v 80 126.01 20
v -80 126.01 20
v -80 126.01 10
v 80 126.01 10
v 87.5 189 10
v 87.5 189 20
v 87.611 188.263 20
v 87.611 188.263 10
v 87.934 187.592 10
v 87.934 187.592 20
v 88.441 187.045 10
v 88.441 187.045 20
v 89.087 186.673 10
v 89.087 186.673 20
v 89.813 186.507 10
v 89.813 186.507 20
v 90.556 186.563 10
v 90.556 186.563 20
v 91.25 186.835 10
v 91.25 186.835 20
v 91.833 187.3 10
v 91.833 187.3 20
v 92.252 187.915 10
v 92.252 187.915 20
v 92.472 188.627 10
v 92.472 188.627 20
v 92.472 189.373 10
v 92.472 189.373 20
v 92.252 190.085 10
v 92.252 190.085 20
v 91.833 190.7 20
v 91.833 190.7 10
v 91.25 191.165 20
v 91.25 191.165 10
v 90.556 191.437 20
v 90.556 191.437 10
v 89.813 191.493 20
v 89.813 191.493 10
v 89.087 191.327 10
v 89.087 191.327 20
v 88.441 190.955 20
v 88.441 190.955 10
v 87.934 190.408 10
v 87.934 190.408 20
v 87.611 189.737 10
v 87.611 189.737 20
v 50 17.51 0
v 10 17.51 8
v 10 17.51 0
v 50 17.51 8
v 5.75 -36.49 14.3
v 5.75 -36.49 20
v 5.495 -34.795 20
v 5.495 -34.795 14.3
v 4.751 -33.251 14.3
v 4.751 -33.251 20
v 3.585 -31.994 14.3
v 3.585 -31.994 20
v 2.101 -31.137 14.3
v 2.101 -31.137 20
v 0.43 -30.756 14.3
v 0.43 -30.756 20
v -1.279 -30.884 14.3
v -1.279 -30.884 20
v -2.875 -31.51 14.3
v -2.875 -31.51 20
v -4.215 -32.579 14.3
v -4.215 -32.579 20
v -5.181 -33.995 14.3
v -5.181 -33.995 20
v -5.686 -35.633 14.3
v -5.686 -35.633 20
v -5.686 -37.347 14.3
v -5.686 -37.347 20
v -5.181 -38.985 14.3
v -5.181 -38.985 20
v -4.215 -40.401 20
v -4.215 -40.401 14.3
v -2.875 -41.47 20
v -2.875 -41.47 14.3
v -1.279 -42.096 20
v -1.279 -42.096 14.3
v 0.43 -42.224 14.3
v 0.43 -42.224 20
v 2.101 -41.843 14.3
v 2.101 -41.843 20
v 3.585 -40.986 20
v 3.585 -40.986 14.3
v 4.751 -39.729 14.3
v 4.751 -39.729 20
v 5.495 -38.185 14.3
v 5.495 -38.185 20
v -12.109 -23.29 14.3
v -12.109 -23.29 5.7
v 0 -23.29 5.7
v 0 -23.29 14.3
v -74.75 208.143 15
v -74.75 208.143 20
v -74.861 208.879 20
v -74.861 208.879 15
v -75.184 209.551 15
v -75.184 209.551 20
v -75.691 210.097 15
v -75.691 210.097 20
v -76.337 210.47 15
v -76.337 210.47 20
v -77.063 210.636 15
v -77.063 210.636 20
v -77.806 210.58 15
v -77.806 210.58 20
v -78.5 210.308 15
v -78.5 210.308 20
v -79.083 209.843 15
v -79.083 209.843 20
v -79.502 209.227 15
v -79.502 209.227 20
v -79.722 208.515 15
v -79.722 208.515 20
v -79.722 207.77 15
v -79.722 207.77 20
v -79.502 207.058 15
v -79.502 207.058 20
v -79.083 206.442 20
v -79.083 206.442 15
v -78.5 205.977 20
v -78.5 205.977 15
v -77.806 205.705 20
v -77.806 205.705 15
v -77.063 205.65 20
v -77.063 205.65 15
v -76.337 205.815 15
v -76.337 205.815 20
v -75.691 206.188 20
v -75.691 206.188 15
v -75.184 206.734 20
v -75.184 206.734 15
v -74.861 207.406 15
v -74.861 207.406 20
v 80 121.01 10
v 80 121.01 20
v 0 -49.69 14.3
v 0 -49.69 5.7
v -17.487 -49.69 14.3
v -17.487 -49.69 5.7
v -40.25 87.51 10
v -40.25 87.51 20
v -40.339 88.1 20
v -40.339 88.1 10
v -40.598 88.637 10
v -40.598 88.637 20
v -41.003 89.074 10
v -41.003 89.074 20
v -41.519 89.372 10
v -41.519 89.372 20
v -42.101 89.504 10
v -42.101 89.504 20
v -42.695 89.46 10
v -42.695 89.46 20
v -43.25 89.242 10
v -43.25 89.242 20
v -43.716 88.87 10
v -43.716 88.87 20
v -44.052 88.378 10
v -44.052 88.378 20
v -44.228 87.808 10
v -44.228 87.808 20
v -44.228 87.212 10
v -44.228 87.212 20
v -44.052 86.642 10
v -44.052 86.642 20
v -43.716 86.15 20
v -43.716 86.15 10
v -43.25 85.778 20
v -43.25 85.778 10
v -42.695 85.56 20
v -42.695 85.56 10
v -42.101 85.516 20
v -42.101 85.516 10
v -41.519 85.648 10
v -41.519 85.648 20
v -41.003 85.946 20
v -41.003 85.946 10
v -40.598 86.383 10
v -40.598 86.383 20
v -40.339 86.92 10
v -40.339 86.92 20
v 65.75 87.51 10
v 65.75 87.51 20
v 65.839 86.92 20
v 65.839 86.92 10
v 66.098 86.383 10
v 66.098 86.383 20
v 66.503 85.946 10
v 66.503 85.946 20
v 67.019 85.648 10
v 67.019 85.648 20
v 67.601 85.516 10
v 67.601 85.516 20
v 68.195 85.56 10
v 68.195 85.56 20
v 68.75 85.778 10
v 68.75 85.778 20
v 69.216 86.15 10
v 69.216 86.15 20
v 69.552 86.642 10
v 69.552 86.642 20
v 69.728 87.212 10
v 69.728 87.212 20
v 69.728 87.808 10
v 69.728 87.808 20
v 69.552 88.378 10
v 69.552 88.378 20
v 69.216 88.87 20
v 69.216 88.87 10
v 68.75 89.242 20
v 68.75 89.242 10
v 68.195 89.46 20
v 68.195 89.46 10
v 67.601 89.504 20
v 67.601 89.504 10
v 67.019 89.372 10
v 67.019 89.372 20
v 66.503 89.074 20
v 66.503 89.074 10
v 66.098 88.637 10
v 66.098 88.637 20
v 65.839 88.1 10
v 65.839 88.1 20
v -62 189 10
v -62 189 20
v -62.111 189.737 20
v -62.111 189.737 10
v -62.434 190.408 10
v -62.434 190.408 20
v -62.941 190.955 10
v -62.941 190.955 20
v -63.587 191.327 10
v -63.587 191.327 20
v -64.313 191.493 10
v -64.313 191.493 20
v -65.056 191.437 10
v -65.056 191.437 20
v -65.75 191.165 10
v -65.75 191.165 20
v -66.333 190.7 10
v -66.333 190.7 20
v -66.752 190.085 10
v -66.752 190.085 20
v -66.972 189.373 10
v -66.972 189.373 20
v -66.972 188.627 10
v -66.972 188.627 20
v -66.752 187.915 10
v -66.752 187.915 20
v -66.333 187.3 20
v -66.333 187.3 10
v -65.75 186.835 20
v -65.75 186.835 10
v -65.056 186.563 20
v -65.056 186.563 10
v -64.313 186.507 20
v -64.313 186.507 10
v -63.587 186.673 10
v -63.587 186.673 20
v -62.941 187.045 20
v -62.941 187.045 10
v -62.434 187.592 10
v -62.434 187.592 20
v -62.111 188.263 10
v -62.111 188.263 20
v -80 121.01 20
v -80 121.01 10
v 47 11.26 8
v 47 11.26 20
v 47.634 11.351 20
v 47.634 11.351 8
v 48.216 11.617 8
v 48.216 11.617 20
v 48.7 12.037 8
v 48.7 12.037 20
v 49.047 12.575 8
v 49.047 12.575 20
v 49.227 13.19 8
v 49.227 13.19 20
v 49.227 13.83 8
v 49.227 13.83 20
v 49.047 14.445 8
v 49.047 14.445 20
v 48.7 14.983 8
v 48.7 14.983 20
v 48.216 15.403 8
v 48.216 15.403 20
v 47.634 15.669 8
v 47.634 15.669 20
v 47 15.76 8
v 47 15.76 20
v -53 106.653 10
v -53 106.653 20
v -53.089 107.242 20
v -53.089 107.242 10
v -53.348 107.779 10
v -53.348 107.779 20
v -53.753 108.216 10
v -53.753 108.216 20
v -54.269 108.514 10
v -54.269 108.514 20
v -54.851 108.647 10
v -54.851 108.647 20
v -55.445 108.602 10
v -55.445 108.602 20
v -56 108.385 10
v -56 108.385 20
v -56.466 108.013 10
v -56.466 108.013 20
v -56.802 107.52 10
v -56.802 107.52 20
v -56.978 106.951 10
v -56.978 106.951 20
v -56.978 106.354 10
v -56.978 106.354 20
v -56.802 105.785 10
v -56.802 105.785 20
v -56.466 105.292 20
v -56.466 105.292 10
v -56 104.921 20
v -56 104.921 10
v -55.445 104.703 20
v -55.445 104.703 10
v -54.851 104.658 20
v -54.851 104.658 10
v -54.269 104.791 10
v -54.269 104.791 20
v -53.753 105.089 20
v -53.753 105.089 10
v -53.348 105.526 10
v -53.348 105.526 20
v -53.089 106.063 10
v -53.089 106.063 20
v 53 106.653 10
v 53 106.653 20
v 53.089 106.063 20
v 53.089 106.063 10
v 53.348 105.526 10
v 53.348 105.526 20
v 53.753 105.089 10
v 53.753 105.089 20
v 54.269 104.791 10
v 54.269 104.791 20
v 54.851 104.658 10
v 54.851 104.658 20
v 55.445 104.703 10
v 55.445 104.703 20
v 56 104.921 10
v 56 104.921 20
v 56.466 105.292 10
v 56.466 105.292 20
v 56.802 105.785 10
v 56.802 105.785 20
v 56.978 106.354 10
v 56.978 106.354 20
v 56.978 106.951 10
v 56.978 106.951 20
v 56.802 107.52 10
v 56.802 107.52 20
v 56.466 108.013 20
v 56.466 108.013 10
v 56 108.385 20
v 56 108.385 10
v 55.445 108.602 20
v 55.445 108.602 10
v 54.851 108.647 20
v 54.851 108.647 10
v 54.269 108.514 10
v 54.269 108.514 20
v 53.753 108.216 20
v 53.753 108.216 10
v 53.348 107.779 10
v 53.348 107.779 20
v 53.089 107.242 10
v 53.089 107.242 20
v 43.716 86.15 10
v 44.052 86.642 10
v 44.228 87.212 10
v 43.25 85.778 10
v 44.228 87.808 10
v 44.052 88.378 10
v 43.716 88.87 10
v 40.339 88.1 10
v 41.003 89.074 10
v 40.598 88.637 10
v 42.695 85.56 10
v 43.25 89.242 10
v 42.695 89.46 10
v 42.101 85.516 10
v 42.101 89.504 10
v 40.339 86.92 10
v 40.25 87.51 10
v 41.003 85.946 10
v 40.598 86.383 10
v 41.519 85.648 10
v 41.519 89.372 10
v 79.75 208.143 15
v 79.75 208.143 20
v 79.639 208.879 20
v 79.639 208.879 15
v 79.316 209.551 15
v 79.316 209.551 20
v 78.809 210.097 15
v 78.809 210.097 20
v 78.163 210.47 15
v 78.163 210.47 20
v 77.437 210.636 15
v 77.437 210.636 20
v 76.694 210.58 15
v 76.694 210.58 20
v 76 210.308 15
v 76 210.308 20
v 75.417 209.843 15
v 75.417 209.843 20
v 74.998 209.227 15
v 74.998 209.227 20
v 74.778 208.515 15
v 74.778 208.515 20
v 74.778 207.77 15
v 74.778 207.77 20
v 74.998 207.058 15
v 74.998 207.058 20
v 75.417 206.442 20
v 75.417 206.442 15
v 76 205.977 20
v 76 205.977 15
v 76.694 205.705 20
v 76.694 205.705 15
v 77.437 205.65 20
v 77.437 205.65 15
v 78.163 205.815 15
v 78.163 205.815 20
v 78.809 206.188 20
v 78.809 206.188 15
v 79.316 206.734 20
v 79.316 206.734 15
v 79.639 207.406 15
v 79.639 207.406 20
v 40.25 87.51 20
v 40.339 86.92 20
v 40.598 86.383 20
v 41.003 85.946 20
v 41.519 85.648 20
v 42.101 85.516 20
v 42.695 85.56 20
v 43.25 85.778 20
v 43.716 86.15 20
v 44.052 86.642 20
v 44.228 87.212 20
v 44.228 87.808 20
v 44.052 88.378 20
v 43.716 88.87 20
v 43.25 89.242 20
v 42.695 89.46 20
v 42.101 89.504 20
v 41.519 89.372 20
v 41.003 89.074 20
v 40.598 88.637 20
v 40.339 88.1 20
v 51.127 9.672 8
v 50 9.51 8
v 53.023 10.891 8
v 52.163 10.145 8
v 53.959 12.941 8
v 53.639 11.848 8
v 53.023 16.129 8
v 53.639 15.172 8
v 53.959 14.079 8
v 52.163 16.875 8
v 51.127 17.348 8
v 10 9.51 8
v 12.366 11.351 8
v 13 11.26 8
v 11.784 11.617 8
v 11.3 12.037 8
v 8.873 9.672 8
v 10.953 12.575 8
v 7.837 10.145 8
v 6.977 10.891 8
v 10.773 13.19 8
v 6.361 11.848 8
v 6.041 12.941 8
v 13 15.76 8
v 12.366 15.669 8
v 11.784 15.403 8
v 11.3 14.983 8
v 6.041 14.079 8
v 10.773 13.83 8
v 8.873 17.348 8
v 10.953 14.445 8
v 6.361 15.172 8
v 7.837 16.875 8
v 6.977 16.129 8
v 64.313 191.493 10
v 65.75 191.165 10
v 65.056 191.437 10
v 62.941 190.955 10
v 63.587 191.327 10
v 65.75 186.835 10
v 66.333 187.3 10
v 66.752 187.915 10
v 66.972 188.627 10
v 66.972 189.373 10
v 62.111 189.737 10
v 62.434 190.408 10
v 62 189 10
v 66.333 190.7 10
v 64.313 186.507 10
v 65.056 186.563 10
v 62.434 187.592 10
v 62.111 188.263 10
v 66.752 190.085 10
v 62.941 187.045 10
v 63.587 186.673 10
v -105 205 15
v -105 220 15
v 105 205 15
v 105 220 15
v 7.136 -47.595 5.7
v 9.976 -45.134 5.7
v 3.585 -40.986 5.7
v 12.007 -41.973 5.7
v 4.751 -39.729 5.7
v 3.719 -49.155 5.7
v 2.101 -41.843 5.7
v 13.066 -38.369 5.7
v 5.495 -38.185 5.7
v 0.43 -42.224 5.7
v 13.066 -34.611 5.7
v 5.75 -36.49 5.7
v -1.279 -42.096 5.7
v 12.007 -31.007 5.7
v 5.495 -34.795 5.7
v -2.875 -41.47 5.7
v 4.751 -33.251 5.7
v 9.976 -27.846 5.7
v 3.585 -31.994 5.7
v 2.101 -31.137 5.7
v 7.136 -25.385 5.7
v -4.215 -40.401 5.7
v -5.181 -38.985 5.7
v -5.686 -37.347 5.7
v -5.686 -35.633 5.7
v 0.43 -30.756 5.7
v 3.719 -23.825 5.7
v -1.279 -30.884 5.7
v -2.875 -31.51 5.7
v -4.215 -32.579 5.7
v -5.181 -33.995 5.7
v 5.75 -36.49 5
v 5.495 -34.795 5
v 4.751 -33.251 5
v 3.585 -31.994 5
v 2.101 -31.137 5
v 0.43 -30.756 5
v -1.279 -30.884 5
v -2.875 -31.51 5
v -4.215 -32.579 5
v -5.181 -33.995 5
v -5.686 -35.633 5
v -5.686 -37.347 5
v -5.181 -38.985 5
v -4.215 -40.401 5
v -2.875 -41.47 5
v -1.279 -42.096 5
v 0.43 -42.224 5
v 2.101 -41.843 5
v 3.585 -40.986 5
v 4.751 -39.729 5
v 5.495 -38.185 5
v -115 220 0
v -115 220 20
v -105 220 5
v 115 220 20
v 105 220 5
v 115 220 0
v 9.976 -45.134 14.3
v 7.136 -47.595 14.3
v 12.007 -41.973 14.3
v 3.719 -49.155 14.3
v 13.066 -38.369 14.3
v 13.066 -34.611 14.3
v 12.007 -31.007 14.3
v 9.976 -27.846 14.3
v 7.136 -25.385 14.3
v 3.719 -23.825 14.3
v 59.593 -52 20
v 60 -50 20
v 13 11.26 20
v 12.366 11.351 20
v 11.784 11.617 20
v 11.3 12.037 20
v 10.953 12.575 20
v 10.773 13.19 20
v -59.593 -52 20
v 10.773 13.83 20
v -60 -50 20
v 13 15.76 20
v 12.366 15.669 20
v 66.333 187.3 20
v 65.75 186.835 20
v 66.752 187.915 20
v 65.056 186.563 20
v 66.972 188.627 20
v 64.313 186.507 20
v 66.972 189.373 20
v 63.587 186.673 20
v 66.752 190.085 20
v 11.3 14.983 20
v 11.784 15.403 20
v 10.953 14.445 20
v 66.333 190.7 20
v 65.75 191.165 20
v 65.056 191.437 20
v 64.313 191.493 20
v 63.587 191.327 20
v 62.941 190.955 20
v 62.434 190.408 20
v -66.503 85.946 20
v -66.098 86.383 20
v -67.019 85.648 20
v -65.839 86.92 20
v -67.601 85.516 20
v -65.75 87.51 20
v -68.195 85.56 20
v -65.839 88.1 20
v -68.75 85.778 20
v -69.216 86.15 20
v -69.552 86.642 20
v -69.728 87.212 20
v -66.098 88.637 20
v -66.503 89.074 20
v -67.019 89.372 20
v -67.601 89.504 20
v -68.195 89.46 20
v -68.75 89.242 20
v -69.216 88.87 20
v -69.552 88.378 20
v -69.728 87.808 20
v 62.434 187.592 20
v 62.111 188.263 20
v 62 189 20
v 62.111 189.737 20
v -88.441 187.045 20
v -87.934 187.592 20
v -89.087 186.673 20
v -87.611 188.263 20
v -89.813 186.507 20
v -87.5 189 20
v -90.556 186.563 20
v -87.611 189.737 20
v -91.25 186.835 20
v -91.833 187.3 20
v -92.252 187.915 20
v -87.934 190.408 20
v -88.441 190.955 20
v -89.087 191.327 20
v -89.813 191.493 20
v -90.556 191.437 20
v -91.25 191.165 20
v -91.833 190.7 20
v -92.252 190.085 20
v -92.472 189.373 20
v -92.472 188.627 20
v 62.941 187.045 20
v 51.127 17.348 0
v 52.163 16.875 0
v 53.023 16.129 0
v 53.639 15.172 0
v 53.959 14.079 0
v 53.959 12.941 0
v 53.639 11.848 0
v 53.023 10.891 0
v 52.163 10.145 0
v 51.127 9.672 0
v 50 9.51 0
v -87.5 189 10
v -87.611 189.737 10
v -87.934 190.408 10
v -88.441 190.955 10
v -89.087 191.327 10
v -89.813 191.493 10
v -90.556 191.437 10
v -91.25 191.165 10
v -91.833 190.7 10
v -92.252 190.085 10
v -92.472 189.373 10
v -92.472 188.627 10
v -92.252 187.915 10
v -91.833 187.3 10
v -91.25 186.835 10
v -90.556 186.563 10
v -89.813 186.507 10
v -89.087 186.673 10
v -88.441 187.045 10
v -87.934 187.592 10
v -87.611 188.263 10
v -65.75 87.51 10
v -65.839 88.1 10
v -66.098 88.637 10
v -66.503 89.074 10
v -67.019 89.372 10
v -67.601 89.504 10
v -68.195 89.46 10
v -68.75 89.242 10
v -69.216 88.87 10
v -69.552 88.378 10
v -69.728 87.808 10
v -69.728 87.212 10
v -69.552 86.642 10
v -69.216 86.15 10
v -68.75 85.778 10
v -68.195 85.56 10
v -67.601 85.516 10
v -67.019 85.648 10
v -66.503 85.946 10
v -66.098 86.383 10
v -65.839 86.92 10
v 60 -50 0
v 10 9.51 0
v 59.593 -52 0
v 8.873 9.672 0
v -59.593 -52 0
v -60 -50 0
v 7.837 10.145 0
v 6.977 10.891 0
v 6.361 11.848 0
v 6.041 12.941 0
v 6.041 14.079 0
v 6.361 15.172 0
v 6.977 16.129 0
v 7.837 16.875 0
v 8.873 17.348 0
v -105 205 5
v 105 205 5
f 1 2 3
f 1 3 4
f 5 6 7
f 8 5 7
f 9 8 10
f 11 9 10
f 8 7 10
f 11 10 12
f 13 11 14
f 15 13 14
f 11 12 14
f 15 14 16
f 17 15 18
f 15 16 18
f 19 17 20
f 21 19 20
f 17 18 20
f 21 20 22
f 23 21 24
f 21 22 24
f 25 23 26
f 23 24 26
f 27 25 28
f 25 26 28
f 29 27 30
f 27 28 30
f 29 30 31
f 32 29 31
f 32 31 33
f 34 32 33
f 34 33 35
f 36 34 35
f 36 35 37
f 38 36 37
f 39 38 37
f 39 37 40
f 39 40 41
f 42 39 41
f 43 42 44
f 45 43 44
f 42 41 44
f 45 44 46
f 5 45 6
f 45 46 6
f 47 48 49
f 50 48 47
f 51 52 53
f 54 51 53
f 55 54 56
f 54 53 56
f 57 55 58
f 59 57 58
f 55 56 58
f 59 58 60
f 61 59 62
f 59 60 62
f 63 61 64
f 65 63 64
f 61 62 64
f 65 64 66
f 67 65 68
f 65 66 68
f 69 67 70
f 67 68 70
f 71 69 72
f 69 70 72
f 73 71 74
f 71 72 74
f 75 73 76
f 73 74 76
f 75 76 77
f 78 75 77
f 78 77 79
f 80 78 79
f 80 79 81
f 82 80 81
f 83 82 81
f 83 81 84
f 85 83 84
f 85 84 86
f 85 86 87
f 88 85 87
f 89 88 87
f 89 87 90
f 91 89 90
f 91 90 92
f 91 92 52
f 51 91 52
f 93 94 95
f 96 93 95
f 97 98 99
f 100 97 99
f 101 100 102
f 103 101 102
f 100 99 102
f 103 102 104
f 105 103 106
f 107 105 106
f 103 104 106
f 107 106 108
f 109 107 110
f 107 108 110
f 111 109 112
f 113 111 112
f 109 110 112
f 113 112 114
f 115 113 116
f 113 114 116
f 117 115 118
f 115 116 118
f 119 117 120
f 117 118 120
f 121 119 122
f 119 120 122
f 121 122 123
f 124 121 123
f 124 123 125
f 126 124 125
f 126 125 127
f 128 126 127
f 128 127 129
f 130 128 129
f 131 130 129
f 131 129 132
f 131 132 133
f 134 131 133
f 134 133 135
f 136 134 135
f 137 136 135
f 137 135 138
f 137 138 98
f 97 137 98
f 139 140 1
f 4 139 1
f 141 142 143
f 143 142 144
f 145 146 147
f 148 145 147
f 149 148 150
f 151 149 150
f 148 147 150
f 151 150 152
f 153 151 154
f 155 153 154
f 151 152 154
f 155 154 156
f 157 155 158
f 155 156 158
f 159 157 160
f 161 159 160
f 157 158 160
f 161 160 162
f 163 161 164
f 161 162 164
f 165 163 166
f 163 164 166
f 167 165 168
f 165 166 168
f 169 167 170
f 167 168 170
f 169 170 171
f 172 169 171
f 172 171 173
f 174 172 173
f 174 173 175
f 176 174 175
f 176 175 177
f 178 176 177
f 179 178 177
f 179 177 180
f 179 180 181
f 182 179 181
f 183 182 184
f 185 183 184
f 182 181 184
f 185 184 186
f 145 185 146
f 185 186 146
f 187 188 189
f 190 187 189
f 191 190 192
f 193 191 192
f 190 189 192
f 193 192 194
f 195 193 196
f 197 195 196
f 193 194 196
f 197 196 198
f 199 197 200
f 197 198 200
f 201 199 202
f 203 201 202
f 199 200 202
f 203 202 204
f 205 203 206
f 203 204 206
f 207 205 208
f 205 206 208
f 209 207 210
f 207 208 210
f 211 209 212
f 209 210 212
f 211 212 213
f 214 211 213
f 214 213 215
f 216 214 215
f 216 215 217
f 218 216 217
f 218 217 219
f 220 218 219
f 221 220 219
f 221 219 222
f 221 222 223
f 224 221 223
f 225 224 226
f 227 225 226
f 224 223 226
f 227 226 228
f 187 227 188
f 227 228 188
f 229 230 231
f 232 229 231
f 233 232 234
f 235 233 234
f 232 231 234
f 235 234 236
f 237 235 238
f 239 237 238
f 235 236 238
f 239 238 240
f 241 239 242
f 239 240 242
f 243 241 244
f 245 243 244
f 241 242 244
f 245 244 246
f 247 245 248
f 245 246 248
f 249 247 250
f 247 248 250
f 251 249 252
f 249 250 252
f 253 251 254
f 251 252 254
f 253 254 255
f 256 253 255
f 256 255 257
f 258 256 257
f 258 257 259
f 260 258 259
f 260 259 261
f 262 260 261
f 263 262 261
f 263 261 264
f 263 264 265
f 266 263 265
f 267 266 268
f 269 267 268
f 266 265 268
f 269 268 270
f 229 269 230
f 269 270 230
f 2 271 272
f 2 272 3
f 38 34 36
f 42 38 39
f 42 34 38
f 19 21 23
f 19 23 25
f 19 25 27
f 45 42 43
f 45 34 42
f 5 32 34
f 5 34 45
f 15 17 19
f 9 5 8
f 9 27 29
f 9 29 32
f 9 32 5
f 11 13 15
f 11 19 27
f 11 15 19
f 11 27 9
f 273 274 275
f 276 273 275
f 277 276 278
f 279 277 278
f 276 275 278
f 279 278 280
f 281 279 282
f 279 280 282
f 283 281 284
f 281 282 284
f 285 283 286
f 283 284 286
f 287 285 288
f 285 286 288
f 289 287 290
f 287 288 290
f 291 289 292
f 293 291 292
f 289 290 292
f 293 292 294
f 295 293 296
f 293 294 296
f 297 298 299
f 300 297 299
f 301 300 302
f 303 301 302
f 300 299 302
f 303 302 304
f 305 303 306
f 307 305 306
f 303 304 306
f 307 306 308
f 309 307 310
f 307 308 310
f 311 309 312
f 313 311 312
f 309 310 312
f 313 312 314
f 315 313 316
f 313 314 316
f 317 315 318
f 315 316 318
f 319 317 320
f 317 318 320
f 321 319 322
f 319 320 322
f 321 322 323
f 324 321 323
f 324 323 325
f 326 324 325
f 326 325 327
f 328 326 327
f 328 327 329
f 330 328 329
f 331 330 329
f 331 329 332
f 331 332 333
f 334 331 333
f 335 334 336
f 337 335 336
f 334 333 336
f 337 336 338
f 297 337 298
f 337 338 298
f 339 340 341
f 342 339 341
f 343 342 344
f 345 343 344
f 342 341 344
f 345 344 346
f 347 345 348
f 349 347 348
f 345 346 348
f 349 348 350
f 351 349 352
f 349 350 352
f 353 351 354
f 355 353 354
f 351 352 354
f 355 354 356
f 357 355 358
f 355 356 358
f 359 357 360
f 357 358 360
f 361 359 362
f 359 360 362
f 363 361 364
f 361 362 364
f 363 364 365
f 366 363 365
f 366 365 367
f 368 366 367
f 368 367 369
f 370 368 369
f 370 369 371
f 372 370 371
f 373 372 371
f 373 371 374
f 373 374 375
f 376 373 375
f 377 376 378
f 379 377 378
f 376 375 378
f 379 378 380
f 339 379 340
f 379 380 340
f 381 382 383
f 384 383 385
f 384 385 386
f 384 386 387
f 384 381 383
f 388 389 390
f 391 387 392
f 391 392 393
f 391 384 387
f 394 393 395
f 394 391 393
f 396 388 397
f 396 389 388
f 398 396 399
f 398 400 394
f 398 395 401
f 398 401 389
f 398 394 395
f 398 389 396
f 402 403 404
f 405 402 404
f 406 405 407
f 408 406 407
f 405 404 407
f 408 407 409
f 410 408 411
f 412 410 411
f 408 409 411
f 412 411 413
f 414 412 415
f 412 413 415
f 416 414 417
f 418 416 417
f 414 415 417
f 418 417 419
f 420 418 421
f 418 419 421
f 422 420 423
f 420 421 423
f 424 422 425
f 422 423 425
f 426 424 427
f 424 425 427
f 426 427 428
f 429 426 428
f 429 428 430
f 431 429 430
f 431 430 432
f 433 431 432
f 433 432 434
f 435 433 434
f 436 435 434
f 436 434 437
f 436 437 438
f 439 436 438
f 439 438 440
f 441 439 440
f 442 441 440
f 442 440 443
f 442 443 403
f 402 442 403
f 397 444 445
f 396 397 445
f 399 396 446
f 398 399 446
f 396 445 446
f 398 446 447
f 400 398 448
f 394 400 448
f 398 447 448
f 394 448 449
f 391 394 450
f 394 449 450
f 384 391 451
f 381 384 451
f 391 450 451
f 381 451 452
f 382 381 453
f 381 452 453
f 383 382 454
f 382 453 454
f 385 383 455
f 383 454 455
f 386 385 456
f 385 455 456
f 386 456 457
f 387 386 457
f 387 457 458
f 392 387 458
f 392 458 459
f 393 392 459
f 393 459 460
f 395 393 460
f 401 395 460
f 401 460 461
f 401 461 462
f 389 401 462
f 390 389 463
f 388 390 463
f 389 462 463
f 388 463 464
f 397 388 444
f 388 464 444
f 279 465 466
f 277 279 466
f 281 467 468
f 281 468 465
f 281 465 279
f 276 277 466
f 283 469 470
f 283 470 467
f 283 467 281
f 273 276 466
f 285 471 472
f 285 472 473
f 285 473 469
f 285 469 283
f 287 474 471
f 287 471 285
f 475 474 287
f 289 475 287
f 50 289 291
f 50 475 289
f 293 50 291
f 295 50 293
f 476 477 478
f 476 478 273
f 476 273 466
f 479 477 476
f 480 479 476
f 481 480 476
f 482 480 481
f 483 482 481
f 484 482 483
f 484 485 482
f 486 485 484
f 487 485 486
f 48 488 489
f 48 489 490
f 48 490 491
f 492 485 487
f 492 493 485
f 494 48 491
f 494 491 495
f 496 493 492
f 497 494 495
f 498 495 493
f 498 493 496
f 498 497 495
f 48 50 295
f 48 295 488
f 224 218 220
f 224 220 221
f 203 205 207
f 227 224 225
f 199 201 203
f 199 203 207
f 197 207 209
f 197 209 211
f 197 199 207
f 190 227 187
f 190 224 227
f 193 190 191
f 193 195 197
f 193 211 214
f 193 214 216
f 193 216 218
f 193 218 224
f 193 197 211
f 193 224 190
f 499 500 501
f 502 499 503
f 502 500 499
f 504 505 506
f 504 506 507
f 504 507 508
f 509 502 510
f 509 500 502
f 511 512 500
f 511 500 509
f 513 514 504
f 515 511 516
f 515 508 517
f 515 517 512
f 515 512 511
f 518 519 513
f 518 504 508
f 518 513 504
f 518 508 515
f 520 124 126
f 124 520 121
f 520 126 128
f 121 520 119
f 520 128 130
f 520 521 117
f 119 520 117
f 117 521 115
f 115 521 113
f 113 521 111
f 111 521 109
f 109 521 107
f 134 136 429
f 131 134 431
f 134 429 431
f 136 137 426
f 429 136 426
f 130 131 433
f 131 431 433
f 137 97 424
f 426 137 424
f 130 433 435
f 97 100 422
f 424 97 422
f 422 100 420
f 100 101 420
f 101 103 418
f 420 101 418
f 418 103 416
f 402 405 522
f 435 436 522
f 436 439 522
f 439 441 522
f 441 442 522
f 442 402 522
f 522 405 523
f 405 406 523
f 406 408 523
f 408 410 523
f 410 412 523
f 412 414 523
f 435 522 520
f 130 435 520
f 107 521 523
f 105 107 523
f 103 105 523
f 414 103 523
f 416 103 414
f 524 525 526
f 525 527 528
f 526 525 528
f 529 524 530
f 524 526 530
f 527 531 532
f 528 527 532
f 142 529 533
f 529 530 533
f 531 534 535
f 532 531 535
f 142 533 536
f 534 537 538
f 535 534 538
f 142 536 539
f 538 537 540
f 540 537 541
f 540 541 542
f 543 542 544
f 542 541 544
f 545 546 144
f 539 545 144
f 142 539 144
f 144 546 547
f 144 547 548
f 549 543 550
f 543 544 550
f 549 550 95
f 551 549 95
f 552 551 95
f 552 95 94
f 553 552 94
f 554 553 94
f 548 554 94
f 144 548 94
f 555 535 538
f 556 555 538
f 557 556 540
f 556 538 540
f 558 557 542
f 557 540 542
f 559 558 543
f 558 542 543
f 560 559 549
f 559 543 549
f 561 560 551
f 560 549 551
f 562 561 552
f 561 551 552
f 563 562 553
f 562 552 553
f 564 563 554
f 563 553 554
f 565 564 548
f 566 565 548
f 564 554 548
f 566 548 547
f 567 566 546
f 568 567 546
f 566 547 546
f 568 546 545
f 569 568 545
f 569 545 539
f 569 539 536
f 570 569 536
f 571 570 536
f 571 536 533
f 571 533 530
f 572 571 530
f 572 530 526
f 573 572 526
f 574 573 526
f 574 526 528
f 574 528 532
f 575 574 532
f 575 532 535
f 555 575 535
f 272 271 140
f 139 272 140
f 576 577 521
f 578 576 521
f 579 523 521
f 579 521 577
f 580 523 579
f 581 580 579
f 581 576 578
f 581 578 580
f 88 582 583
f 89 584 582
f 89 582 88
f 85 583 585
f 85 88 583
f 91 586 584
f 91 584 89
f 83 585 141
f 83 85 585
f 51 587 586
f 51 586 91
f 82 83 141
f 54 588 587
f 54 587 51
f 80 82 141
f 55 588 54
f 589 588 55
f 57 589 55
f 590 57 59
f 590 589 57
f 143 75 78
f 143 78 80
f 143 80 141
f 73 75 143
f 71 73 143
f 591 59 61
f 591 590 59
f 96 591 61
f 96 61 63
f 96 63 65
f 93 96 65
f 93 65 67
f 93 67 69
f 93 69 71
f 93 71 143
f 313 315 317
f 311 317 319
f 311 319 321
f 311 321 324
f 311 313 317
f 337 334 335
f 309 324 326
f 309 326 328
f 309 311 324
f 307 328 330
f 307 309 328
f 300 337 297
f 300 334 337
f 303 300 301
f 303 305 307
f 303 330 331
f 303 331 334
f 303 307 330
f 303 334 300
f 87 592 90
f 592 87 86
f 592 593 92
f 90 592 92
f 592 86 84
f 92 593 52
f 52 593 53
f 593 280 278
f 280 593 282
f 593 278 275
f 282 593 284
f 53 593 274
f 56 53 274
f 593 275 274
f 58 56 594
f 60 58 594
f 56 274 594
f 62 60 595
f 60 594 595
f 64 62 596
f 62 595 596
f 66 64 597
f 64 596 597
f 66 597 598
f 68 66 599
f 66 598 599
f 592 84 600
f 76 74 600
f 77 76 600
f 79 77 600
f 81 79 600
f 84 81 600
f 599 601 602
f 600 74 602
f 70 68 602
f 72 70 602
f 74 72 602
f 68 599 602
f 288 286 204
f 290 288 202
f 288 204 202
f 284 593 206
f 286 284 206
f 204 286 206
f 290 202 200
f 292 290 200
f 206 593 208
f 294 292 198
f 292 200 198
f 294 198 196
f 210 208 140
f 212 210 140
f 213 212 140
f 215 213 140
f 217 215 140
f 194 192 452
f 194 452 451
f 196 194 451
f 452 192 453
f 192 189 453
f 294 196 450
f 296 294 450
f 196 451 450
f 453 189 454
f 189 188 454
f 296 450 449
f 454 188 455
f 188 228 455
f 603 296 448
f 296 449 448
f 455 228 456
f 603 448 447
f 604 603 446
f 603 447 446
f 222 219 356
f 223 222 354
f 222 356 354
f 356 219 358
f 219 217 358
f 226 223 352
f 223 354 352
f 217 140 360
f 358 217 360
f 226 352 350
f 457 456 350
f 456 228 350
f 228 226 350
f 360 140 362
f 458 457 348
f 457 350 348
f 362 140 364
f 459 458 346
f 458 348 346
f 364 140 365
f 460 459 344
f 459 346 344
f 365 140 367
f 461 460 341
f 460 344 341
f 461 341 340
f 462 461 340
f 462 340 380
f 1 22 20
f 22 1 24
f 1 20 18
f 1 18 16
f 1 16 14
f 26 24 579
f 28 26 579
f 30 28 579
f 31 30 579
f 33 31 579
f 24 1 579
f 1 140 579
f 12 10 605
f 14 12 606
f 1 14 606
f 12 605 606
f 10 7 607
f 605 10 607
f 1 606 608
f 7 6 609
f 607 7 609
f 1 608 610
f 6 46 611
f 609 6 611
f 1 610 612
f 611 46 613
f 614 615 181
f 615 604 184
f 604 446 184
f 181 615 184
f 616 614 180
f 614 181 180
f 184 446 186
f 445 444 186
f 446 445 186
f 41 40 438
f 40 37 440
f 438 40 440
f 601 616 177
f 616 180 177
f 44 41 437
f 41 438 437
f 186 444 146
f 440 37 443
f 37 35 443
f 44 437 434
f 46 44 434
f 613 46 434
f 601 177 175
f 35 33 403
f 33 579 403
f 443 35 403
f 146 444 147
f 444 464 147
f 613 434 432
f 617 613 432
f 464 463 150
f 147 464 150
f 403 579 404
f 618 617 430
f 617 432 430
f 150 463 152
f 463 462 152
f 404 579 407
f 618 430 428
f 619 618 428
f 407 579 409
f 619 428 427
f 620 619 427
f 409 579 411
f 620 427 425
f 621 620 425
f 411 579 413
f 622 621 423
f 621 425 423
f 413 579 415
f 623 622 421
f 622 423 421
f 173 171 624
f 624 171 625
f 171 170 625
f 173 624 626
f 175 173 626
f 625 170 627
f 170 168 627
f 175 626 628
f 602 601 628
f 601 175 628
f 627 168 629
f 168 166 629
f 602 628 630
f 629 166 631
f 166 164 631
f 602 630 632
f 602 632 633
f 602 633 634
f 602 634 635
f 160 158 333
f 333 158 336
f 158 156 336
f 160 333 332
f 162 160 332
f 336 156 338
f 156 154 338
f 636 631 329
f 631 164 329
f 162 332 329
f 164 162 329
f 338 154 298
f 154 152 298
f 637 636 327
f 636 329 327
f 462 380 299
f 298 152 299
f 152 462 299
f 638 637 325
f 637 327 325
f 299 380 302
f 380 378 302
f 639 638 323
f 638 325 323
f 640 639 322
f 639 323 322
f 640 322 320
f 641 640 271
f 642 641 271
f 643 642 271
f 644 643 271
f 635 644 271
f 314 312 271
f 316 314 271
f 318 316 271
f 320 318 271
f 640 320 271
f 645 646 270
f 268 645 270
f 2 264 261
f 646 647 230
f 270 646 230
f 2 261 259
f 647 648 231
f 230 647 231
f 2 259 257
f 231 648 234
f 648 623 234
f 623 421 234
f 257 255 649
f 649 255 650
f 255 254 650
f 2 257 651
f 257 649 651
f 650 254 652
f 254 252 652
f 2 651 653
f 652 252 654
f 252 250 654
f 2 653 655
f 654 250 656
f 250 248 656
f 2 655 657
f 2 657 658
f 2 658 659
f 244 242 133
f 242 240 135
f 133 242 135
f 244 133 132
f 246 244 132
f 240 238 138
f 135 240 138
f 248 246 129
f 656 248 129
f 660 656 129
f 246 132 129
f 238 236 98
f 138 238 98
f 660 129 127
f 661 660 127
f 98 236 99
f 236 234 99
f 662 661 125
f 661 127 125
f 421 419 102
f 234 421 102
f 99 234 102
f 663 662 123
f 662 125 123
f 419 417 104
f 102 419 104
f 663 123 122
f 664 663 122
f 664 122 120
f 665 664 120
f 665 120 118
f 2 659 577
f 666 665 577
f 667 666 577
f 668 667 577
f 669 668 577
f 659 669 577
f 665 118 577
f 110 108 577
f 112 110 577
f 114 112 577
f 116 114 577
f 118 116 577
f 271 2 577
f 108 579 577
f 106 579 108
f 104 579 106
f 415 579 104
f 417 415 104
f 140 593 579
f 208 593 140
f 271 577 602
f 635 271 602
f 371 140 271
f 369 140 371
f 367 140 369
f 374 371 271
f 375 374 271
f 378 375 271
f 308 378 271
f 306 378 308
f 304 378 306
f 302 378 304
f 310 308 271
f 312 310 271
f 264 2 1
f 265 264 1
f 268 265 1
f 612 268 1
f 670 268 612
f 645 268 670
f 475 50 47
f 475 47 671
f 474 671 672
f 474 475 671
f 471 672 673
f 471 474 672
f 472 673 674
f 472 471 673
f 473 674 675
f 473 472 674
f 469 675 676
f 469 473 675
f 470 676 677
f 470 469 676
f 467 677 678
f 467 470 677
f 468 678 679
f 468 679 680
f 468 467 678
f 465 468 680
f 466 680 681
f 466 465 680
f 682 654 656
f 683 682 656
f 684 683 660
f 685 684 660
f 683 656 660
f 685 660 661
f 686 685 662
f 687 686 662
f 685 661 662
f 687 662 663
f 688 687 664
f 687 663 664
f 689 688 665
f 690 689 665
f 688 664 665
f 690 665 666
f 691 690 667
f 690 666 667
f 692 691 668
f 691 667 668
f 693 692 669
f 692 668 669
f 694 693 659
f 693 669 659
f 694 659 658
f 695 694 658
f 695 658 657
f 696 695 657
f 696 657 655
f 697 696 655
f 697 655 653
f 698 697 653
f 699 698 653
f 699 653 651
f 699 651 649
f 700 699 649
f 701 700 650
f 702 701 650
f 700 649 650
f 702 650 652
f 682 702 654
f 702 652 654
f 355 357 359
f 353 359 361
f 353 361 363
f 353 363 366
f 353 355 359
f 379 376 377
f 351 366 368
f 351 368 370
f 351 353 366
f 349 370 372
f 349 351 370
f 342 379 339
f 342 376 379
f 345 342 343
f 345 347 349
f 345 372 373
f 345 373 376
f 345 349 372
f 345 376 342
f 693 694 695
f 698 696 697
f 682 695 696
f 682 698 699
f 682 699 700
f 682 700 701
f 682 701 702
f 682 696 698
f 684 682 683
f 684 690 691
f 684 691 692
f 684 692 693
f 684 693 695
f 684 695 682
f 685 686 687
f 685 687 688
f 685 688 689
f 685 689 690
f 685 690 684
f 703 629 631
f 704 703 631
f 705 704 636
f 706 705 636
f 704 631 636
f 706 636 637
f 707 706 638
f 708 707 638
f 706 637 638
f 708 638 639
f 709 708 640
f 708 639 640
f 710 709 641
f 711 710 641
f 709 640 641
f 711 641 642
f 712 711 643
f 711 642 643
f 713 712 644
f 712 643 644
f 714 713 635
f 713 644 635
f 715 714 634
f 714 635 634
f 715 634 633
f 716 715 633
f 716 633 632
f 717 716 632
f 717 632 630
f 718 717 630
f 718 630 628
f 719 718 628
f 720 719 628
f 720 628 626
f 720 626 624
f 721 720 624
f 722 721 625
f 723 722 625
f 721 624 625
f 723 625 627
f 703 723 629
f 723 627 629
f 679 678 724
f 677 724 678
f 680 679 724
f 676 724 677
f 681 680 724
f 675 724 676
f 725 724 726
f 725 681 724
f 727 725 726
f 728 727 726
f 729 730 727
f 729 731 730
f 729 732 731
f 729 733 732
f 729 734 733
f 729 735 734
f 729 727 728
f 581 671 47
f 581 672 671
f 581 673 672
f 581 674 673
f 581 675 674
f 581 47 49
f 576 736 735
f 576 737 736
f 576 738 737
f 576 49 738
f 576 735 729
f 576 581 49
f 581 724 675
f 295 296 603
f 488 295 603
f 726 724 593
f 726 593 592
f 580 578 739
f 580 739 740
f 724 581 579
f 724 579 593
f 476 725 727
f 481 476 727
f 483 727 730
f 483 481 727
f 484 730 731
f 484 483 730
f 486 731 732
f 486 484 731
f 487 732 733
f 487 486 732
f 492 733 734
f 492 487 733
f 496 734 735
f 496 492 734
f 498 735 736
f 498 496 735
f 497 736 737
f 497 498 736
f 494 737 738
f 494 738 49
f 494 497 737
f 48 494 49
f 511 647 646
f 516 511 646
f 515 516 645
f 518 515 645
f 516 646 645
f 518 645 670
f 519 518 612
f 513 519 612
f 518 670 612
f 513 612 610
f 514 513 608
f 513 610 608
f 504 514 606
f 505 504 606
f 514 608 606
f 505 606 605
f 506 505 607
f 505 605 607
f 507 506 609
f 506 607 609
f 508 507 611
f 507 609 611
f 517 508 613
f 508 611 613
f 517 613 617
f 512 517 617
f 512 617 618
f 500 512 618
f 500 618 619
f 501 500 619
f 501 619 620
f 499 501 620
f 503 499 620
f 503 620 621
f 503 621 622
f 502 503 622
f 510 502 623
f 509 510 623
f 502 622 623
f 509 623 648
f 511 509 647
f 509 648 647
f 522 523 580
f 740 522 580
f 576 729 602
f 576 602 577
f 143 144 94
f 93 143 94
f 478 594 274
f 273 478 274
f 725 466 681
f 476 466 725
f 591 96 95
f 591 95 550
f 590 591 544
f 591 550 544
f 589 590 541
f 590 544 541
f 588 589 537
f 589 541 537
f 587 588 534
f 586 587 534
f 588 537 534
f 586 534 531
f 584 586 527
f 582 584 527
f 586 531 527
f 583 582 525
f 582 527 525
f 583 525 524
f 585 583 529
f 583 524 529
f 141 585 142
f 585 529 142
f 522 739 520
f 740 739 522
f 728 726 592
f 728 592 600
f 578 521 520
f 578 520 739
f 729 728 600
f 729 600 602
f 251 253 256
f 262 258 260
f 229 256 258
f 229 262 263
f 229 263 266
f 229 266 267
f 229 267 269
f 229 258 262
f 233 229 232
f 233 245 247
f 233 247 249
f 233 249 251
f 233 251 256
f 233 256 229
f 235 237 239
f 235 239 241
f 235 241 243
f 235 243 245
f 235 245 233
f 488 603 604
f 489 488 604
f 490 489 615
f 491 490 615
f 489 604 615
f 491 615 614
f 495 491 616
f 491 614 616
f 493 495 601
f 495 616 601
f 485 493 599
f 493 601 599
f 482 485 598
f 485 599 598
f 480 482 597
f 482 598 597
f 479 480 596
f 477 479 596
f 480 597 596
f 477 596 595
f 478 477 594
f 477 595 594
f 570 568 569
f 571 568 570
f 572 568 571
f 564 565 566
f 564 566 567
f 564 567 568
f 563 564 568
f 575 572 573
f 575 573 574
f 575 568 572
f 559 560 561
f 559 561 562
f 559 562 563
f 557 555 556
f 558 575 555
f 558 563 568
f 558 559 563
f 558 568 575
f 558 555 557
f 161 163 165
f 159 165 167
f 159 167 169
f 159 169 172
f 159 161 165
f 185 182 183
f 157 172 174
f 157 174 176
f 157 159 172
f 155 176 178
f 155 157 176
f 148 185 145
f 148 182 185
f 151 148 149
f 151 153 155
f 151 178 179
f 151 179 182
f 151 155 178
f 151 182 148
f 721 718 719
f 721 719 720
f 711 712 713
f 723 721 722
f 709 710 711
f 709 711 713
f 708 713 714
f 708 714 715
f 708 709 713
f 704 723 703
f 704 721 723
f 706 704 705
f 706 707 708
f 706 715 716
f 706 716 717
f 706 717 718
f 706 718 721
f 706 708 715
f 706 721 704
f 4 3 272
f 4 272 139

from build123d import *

# Parameters (mm, degrees)
EXTRUDE_1_DEPTH     = 20
SKETCH_3_W          = 210
SKETCH_3_H          = 10
CUT_EXTRUDE_1_DEPTH = 15
SKETCH_4_W          = 160
SKETCH_4_H          = 5
CUT_EXTRUDE_2_DEPTH = 10
SKETCH_5_R          = 2.5
SKETCH_5_R_2        = 2
CUT_EXTRUDE_3_DEPTH = 10
CUT_EXTRUDE_4_DEPTH = 4.3
SKETCH_8_R          = 5.75
CUT_EXTRUDE_6_DEPTH = 15
CUT_EXTRUDE_7_DEPTH = 250.048188108
CUT_EXTRUDE_START   = -8
CUT_EXTRUDE_8_DEPTH = 8


with BuildPart() as part:
    # 草图1 → 凸台-拉伸1 (new body)
    with BuildSketch(Plane.XY):
        Polygon((-115, 220), (115, 220), (60, -50), (59.592592593, -52), (-59.592592593, -52), (-60, -50), align=None)
    extrude(amount=EXTRUDE_1_DEPTH)

    # 草图3 → 切除-拉伸1 (cut)
    with BuildSketch(Plane(origin=(0, 220, 0), x_dir=(1, 0, 0), z_dir=(0, 1, 0))):
        with Locations((0, -10)):
            Rectangle(SKETCH_3_W, SKETCH_3_H)
    extrude(amount=-CUT_EXTRUDE_1_DEPTH, mode=Mode.SUBTRACT)

    # 草图4 → 切除-拉伸2 (cut)
    with BuildSketch(Plane.XY.offset(20)):
        with Locations((0, 123.51)):
            Rectangle(SKETCH_4_W, SKETCH_4_H)
    extrude(amount=-CUT_EXTRUDE_2_DEPTH, mode=Mode.SUBTRACT)

    # 草图5 → 切除-拉伸3 (cut)
    with BuildSketch(Plane.XY.offset(20)):
        with Locations((-77.25, 208.1425573)):
            Circle(SKETCH_5_R)
        with Locations((-90, 189)):
            Circle(SKETCH_5_R)
        with Locations((-64.5, 189)):
            Circle(SKETCH_5_R)
        with Locations((-55, 106.6525573)):
            Circle(SKETCH_5_R_2)
        with Locations((-67.75, 87.51)):
            Circle(SKETCH_5_R_2)
        with Locations((-42.25, 87.51)):
            Circle(SKETCH_5_R_2)
        with Locations(Location((42.25, 87.51, 0), (0, 0, 180))):
            Circle(SKETCH_5_R_2)
        with Locations(Location((67.75, 87.51, 0), (0, 0, 180))):
            Circle(SKETCH_5_R_2)
        with Locations(Location((55, 106.6525573, 0), (0, 0, 180))):
            Circle(SKETCH_5_R_2)
        with Locations(Location((64.5, 189, 0), (0, 0, 180))):
            Circle(SKETCH_5_R)
        with Locations(Location((90, 189, 0), (0, 0, 180))):
            Circle(SKETCH_5_R)
        with Locations((77.25, 208.1425573)):
            Circle(SKETCH_5_R)
    extrude(amount=-CUT_EXTRUDE_3_DEPTH, mode=Mode.SUBTRACT)

    # 草图6 → 切除-拉伸4 (cut, symmetric)
    with BuildSketch(Plane(origin=(0, 0, 10), x_dir=(-1, 0, 0), z_dir=(0, 0, -1))):
        with BuildLine():
            Line((0, -49.69), (17.486671343, -49.69))
            Line((17.486671343, -49.69), (12.108893566, -23.29))
            Line((12.108893566, -23.29), (0, -23.29))
            ThreePointArc((0, -23.29), (-13.2, -36.49), (0, -49.69))
        make_face()
    extrude(amount=CUT_EXTRUDE_4_DEPTH, both=True, mode=Mode.SUBTRACT)

    # 草图8 → 切除-拉伸6 (cut)
    with BuildSketch(Plane.XY.offset(20)):
        with Locations((0, -36.49)):
            Circle(SKETCH_8_R)
    extrude(amount=-CUT_EXTRUDE_6_DEPTH, mode=Mode.SUBTRACT)

    # 草图9 → 切除-拉伸7 (cut, through all)
    with BuildSketch(Plane.XY.offset(20)):
        with BuildLine():
            Line((13, 11.26), (47, 11.26))
            ThreePointArc((47, 11.26), (49.25, 13.51), (47, 15.76))
            Line((47, 15.76), (13, 15.76))
            ThreePointArc((13, 15.76), (10.75, 13.51), (13, 11.26))
        make_face()
    extrude(amount=-CUT_EXTRUDE_7_DEPTH, mode=Mode.SUBTRACT)

    # 草图10 → 切除-拉伸8 (cut)
    with BuildSketch(Plane(origin=(0, 0, 0), x_dir=(-1, 0, 0), z_dir=(0, 0, -1)).offset(CUT_EXTRUDE_START)):
        with BuildLine():
            Line((-50, 9.51), (-10, 9.51))
            ThreePointArc((-10, 9.51), (-6, 13.51), (-10, 17.51))
            Line((-10, 17.51), (-50, 17.51))
            ThreePointArc((-50, 17.51), (-54, 13.51), (-50, 9.51))
        make_face()
        with BuildLine():
            Line((-47, 15.76), (-13, 15.76))
            ThreePointArc((-13, 15.76), (-10.75, 13.51), (-13, 11.26))
            Line((-13, 11.26), (-47, 11.26))
            ThreePointArc((-47, 11.26), (-49.25, 13.51), (-47, 15.76))
        make_face(mode=Mode.SUBTRACT)
    extrude(amount=CUT_EXTRUDE_8_DEPTH, mode=Mode.SUBTRACT)


solid = part.part
